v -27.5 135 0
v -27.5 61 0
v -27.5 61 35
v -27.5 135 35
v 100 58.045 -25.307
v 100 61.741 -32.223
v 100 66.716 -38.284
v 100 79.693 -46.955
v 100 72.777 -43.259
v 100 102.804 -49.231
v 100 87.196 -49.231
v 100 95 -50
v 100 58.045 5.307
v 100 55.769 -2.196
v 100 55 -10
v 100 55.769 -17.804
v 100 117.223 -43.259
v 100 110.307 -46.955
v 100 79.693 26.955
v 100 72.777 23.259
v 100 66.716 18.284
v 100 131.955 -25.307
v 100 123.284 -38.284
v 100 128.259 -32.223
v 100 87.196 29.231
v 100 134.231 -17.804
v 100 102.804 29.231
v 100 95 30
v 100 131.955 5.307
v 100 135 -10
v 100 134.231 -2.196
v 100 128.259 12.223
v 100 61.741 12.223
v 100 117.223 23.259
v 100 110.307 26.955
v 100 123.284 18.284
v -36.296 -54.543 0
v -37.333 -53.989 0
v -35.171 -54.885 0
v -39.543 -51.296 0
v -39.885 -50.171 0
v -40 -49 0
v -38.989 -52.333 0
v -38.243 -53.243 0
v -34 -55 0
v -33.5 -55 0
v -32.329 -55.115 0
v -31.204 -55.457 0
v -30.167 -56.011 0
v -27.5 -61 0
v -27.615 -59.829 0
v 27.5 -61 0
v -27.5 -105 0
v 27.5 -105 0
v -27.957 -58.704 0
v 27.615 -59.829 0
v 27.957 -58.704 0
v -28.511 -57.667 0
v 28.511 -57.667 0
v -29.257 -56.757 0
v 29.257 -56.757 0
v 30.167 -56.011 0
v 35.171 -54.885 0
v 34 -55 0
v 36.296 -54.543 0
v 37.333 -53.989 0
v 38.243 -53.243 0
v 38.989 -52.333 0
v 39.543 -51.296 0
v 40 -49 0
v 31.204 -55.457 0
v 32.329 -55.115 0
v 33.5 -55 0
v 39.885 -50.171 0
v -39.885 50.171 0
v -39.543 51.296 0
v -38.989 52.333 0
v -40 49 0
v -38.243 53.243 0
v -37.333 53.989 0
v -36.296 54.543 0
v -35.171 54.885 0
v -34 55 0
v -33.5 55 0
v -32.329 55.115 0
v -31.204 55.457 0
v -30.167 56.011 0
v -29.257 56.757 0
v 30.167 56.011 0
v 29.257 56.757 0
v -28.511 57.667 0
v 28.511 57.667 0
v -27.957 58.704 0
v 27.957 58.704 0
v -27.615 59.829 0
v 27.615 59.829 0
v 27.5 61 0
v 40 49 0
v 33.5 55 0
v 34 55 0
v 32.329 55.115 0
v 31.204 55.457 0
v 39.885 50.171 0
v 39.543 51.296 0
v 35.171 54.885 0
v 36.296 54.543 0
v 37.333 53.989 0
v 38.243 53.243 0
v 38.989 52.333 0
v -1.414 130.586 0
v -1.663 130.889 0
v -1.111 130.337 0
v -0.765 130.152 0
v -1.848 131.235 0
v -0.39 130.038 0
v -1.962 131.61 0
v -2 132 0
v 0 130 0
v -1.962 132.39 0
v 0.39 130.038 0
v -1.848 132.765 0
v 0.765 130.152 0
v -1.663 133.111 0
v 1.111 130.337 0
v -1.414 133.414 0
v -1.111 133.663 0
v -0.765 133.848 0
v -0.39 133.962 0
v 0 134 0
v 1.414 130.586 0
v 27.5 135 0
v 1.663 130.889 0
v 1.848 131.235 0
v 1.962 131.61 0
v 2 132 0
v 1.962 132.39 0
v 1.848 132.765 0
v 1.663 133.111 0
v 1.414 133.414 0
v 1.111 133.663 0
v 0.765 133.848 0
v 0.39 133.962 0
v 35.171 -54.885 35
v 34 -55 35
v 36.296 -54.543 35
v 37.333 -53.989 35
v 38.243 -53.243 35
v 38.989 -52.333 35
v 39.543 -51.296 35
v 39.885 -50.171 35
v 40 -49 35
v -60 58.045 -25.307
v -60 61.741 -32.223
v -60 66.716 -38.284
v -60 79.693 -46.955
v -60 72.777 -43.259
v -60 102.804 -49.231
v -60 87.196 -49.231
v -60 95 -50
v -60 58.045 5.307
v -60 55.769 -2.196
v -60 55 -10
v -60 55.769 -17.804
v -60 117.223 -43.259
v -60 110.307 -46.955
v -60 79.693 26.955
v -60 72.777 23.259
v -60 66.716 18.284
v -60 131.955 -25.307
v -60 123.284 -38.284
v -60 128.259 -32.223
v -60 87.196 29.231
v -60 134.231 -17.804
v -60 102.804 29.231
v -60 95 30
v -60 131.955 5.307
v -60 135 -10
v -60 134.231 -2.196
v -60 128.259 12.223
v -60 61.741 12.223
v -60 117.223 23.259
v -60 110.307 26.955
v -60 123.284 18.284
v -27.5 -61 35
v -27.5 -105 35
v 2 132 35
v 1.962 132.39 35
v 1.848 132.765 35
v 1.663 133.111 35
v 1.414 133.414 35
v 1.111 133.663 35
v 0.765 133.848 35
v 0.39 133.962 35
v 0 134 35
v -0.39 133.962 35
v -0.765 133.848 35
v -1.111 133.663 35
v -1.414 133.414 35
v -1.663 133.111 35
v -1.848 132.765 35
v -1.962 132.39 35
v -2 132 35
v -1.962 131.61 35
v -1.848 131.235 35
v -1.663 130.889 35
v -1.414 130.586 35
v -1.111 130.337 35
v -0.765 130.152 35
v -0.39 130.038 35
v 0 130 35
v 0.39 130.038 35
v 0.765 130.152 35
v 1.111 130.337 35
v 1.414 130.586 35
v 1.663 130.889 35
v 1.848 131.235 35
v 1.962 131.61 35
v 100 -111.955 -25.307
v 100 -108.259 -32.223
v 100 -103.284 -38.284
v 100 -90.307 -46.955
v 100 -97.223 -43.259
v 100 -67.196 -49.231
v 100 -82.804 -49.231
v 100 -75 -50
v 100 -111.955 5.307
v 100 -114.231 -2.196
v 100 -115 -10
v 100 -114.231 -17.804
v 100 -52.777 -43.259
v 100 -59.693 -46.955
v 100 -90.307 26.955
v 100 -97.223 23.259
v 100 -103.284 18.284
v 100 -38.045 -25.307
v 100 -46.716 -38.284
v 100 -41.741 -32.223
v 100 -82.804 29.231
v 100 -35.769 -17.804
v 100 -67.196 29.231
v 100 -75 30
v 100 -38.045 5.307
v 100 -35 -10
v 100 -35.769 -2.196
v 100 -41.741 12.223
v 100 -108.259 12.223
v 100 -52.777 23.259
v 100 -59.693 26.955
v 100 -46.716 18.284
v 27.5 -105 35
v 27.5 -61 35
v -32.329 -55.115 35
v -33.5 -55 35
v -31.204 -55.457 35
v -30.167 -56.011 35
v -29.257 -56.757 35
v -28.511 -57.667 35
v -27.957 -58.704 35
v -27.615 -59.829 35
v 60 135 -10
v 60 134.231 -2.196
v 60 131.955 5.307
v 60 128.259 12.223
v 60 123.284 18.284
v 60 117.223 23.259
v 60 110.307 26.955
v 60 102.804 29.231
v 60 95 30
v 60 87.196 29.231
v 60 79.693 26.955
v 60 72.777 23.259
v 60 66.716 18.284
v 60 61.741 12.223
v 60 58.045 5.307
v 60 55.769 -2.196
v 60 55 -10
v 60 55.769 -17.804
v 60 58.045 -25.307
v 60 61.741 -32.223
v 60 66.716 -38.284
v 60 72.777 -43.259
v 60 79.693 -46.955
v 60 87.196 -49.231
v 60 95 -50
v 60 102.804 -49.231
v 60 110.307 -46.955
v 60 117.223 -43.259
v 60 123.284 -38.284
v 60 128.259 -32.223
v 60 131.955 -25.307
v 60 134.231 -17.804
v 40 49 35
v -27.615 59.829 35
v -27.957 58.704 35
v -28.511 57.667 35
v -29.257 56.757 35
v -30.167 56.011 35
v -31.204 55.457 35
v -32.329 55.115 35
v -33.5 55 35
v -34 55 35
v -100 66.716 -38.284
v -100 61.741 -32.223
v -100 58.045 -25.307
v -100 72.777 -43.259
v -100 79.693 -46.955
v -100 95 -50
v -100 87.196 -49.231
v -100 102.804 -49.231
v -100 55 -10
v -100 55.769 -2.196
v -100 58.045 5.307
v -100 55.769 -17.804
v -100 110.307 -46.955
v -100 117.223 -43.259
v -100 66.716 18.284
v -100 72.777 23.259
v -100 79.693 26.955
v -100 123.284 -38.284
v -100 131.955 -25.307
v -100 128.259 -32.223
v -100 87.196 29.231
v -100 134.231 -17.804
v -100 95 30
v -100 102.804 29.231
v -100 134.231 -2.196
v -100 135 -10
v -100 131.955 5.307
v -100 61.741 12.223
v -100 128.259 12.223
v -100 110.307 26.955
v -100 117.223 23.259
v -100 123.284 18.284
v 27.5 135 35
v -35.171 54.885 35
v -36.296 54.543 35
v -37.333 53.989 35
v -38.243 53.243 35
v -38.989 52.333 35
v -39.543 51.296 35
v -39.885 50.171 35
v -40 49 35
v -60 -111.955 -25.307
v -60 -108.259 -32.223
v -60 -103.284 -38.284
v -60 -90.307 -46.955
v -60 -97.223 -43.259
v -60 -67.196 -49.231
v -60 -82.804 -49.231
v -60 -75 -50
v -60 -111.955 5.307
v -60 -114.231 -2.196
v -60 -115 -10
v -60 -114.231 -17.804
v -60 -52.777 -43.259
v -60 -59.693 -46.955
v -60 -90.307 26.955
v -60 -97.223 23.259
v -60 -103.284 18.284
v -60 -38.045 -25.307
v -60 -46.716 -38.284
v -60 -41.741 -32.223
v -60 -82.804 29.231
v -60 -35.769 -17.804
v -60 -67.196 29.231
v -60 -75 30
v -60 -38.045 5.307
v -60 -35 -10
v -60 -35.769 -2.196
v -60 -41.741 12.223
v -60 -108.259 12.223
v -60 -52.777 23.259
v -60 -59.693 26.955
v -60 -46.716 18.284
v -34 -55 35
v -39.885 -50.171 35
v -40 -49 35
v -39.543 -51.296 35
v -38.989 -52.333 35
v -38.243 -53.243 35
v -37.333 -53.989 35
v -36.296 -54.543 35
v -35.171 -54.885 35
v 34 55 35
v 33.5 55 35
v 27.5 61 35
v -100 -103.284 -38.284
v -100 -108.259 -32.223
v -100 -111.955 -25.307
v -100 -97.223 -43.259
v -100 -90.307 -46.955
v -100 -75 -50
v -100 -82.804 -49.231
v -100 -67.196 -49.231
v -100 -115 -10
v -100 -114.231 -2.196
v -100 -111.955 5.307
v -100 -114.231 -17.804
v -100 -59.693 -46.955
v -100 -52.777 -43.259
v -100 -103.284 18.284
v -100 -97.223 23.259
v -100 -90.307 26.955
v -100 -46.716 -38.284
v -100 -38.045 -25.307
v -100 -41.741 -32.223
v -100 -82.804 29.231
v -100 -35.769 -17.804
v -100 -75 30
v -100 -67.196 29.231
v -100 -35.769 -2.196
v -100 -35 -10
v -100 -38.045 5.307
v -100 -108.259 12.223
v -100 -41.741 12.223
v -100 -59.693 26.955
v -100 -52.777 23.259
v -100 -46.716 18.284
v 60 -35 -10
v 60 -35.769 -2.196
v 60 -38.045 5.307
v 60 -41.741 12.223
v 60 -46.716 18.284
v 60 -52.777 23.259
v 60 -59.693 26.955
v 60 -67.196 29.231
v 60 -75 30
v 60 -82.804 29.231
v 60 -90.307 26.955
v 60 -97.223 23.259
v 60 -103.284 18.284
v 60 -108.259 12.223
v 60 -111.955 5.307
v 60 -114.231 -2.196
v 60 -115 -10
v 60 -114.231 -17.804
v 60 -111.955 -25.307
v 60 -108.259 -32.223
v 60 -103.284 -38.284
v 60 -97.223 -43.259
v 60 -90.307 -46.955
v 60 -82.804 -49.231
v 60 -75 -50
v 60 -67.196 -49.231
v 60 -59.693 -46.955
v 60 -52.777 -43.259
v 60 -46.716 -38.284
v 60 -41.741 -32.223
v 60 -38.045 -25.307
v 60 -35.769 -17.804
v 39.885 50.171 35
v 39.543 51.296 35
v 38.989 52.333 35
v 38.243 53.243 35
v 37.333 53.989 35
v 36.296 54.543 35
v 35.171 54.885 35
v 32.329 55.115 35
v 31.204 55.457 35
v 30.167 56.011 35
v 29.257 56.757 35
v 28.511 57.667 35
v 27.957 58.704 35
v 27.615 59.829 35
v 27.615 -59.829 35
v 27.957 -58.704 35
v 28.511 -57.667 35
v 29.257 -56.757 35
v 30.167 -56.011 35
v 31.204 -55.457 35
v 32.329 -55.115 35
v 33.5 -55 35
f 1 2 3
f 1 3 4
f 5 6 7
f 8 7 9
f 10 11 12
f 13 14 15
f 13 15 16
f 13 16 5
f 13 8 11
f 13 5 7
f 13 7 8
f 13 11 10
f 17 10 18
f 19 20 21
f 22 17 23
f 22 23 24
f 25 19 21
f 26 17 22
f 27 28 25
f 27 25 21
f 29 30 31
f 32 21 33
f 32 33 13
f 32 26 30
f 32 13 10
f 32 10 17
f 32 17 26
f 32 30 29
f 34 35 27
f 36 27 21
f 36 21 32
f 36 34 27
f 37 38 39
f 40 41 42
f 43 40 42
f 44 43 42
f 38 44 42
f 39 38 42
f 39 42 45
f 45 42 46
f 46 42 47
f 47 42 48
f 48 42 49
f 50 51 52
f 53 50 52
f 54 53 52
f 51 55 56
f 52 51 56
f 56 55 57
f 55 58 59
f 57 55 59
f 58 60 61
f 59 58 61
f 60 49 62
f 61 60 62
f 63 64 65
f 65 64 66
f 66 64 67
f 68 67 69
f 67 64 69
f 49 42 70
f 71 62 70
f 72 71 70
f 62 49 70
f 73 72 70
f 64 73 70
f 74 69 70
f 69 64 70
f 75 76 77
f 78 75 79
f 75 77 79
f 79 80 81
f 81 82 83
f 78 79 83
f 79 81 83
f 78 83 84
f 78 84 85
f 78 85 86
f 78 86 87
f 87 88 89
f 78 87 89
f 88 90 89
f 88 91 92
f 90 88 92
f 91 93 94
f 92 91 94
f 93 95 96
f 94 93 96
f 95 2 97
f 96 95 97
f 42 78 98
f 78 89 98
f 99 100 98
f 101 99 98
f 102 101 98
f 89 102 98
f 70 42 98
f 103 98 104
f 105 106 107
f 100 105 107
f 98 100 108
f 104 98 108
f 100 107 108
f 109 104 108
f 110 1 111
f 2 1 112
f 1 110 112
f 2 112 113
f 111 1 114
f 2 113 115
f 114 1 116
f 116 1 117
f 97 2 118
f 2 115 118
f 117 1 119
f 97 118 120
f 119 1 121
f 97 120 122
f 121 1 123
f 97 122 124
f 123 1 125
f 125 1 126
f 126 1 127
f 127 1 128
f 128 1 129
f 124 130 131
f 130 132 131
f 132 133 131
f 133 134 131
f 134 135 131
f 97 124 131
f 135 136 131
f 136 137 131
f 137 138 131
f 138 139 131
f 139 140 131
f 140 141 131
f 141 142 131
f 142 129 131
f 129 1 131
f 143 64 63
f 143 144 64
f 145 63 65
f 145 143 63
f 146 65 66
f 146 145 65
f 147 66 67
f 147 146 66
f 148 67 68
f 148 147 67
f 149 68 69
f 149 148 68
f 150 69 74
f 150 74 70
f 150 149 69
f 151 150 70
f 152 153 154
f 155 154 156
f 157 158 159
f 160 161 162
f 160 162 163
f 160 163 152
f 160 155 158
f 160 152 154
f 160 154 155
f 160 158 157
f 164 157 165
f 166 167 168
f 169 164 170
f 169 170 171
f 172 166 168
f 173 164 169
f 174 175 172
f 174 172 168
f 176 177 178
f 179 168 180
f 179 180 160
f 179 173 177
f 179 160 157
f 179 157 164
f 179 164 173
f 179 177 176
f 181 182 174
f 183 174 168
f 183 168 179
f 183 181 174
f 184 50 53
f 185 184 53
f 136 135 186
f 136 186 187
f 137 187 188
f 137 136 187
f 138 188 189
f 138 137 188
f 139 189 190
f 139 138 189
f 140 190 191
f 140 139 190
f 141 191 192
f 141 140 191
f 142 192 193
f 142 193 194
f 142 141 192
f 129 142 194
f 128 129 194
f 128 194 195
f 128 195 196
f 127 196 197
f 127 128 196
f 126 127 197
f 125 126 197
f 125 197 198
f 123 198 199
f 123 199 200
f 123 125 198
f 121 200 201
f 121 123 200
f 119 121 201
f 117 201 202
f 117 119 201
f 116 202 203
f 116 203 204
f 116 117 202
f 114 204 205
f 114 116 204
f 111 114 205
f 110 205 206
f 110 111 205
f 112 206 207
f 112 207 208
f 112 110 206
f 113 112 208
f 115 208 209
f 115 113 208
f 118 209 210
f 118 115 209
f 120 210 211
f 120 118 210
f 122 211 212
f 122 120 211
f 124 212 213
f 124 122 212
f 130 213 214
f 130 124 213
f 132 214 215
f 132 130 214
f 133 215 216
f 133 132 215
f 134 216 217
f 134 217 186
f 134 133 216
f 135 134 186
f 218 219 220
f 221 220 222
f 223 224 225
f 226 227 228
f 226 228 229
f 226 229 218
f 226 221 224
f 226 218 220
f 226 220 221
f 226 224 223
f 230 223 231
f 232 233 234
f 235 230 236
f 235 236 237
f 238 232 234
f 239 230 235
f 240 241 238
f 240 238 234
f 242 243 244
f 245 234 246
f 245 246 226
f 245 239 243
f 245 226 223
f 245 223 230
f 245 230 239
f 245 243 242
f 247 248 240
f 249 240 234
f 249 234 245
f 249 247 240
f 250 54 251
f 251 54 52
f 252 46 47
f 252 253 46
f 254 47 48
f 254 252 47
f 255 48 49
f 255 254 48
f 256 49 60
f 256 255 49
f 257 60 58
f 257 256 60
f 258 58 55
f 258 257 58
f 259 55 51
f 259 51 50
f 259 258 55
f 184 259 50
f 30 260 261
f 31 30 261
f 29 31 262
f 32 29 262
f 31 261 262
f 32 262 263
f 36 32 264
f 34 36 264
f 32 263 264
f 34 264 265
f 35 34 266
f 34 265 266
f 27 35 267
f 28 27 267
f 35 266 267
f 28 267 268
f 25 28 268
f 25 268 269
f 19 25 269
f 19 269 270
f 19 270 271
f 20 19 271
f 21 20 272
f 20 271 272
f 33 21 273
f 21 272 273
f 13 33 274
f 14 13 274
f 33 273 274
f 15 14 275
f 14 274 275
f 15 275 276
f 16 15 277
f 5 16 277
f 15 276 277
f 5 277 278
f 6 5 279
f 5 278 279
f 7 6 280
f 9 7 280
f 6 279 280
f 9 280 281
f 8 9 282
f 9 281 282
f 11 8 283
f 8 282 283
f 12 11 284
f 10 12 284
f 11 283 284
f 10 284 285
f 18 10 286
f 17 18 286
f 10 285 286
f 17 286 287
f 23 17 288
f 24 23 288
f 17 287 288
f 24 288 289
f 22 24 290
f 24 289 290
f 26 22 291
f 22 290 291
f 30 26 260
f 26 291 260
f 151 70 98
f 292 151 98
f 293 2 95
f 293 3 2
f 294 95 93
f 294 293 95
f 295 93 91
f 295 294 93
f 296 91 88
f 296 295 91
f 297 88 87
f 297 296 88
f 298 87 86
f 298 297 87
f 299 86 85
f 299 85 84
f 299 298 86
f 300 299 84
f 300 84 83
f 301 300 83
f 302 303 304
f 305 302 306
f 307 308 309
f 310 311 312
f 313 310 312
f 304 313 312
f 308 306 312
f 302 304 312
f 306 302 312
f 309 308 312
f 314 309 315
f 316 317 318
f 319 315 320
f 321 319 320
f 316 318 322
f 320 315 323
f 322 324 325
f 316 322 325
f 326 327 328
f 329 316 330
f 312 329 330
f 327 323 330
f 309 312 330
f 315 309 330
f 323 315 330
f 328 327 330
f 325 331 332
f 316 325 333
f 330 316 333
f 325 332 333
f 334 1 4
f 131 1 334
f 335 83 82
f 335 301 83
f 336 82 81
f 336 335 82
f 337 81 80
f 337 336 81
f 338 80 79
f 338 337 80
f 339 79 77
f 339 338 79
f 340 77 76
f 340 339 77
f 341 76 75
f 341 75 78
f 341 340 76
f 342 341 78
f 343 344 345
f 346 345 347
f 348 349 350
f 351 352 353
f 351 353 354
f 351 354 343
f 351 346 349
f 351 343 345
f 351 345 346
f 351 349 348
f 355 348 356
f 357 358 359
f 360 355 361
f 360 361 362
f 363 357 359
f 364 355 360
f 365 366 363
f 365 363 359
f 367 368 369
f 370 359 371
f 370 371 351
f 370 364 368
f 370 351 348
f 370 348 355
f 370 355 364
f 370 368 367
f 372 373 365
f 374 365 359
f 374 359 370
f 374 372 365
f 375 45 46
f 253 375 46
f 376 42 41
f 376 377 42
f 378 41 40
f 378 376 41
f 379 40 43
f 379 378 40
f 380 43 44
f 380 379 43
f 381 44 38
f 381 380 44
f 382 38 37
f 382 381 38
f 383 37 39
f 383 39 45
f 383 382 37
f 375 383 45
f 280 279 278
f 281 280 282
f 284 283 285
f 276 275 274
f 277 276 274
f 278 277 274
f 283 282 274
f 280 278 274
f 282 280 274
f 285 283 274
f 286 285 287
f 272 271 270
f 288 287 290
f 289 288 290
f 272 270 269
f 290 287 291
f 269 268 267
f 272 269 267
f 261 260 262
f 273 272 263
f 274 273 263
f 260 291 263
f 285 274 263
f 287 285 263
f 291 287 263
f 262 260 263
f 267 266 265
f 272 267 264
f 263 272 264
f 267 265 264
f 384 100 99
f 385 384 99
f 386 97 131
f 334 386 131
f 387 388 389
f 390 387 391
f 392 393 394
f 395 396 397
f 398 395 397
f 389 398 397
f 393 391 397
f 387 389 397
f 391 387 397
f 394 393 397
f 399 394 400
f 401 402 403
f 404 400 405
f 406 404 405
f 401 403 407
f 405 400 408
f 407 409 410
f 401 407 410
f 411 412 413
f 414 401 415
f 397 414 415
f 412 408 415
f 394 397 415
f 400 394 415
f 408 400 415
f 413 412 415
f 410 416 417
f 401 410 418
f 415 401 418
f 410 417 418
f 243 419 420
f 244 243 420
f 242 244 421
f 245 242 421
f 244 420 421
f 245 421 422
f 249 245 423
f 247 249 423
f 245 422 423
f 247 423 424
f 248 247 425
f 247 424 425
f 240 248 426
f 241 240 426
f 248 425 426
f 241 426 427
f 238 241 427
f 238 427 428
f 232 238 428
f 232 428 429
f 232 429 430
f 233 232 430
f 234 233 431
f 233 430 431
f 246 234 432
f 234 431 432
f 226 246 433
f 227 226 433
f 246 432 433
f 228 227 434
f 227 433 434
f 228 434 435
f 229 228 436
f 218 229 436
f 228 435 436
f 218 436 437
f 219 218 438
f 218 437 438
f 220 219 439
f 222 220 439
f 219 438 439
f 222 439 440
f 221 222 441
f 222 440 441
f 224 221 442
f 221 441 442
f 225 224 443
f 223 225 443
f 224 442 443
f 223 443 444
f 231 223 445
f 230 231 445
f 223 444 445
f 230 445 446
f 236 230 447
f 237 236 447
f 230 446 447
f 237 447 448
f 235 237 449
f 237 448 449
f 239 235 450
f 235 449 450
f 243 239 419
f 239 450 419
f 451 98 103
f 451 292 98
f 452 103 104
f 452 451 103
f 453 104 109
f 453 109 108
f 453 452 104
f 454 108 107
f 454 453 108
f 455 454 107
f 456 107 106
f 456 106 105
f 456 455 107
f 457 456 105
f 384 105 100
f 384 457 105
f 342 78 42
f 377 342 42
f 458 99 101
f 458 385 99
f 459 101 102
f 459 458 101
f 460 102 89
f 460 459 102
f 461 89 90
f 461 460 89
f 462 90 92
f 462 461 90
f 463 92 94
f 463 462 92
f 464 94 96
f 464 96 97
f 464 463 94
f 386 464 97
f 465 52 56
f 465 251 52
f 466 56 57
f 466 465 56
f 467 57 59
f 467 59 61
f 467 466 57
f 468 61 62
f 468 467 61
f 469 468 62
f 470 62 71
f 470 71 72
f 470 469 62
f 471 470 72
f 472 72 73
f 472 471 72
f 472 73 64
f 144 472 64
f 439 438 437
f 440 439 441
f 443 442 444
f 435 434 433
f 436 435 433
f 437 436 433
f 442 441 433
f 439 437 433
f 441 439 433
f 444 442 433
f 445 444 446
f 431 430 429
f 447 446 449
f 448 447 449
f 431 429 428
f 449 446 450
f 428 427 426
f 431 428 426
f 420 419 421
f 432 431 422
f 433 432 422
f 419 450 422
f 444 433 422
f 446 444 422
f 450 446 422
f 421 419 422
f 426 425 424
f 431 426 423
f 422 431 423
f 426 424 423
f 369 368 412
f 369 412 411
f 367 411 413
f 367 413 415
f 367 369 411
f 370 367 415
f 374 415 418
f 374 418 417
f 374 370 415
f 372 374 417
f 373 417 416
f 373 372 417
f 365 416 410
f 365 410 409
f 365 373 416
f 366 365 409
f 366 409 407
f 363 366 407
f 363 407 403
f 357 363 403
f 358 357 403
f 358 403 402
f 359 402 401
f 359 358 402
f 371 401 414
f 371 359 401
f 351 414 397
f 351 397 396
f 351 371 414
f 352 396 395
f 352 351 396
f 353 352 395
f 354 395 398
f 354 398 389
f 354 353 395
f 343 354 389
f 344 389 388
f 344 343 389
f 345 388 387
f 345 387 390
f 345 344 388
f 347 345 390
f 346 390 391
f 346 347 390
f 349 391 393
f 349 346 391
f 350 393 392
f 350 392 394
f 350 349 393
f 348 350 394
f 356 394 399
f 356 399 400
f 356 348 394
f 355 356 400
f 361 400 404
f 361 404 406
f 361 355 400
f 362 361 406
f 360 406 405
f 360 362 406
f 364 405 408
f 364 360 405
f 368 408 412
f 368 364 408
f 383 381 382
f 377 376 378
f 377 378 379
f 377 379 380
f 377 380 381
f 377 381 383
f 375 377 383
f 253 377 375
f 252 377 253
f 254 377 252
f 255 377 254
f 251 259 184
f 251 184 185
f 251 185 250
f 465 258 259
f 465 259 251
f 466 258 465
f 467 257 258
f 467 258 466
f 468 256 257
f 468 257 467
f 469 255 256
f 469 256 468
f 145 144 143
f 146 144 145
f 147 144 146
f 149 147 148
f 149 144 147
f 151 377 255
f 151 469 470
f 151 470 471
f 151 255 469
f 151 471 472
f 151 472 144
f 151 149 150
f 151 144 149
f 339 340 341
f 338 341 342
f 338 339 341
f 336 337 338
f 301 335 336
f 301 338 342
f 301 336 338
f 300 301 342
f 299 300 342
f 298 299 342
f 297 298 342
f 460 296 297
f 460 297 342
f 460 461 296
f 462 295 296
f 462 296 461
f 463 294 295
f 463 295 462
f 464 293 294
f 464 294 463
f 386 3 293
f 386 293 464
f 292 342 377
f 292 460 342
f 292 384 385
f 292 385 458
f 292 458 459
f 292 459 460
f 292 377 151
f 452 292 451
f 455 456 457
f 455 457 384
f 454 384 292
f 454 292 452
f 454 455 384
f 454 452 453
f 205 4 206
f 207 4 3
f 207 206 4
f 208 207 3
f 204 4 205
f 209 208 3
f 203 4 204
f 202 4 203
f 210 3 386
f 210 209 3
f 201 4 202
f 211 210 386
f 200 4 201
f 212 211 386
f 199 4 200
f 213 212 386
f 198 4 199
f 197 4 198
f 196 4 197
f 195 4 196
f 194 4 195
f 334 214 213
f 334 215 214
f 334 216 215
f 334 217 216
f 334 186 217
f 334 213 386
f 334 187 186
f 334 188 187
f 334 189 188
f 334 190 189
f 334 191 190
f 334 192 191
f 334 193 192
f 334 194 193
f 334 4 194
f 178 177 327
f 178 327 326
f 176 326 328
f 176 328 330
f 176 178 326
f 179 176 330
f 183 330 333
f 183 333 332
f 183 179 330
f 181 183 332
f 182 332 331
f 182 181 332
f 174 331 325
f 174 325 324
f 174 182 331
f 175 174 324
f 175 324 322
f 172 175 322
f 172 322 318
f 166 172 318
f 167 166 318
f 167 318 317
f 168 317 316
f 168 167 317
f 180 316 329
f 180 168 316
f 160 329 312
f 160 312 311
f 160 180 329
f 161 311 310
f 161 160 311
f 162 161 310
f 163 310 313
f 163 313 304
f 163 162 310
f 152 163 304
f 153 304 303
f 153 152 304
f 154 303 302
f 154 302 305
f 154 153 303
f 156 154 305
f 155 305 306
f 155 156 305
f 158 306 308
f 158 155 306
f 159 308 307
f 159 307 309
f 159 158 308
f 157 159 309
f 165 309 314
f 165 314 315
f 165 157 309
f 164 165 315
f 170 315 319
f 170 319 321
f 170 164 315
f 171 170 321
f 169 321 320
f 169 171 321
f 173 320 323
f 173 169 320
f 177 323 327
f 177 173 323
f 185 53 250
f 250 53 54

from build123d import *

# Parameters (mm, degrees)
F0_W     = 55
F0_H     = 80
F0_R     = 2
F1_DEPTH = 35
F2_R     = 6
F4_START = 60
F3_R     = 40
F4_DEPTH = 40


with BuildPart() as f1:
    # F0 (on Top) → F1 (new body)
    with BuildSketch(Plane.XY):
        with Locations((0, 95)):
            Rectangle(F0_W, F0_H)
        with Locations((0, 132)):
            Circle(F0_R, mode=Mode.SUBTRACT)
        Polygon((40, -55), (40, 55), (27.5, 55), (-27.5, 55), (-40, 55), (-40, -55), (-27.5, -55), (27.5, -55), align=None)
        Polygon((27.5, -98), (27.5, -55), (-27.5, -55), (-27.5, -98), (-27.5, -105), (27.5, -105), align=None)
    extrude(amount=F1_DEPTH)

    # F2
    f2_edges = [f1.edges().sort_by_distance(p)[0] for p in [
        (27.5, -55, 17.5),
        (40, -55, 17.5),
        (-40, -55, 17.5),
        (-27.5, -55, 17.5),
        (-40, 55, 17.5),
        (-27.5, 55, 17.5),
        (40, 55, 17.5),
        (27.5, 55, 17.5),
    ]]
    fillet(f2_edges, radius=F2_R)


with BuildPart() as f4:
    # F3 (on Right) → F4 (new body)
    with BuildSketch(Plane.YZ.offset(F4_START)):
        with Locations((-75, -10)):
            Circle(F3_R)
    extrude(amount=F4_DEPTH)


with BuildPart() as f4b:
    # F3 (on Right) → F4, piece 2 (new body)
    with BuildSketch(Plane.YZ.offset(F4_START)):
        with Locations((95, -10)):
            Circle(F3_R)
    extrude(amount=F4_DEPTH)


with BuildPart() as f5_1:
    # F5: instance of F4
    add(f4.part.mirror(Plane.YZ))


with BuildPart() as f5_2:
    # F5: instance of F4b
    add(f4b.part.mirror(Plane.YZ))


solid = Compound([f1.part, f4.part, f4b.part, f5_1.part, f5_2.part])
